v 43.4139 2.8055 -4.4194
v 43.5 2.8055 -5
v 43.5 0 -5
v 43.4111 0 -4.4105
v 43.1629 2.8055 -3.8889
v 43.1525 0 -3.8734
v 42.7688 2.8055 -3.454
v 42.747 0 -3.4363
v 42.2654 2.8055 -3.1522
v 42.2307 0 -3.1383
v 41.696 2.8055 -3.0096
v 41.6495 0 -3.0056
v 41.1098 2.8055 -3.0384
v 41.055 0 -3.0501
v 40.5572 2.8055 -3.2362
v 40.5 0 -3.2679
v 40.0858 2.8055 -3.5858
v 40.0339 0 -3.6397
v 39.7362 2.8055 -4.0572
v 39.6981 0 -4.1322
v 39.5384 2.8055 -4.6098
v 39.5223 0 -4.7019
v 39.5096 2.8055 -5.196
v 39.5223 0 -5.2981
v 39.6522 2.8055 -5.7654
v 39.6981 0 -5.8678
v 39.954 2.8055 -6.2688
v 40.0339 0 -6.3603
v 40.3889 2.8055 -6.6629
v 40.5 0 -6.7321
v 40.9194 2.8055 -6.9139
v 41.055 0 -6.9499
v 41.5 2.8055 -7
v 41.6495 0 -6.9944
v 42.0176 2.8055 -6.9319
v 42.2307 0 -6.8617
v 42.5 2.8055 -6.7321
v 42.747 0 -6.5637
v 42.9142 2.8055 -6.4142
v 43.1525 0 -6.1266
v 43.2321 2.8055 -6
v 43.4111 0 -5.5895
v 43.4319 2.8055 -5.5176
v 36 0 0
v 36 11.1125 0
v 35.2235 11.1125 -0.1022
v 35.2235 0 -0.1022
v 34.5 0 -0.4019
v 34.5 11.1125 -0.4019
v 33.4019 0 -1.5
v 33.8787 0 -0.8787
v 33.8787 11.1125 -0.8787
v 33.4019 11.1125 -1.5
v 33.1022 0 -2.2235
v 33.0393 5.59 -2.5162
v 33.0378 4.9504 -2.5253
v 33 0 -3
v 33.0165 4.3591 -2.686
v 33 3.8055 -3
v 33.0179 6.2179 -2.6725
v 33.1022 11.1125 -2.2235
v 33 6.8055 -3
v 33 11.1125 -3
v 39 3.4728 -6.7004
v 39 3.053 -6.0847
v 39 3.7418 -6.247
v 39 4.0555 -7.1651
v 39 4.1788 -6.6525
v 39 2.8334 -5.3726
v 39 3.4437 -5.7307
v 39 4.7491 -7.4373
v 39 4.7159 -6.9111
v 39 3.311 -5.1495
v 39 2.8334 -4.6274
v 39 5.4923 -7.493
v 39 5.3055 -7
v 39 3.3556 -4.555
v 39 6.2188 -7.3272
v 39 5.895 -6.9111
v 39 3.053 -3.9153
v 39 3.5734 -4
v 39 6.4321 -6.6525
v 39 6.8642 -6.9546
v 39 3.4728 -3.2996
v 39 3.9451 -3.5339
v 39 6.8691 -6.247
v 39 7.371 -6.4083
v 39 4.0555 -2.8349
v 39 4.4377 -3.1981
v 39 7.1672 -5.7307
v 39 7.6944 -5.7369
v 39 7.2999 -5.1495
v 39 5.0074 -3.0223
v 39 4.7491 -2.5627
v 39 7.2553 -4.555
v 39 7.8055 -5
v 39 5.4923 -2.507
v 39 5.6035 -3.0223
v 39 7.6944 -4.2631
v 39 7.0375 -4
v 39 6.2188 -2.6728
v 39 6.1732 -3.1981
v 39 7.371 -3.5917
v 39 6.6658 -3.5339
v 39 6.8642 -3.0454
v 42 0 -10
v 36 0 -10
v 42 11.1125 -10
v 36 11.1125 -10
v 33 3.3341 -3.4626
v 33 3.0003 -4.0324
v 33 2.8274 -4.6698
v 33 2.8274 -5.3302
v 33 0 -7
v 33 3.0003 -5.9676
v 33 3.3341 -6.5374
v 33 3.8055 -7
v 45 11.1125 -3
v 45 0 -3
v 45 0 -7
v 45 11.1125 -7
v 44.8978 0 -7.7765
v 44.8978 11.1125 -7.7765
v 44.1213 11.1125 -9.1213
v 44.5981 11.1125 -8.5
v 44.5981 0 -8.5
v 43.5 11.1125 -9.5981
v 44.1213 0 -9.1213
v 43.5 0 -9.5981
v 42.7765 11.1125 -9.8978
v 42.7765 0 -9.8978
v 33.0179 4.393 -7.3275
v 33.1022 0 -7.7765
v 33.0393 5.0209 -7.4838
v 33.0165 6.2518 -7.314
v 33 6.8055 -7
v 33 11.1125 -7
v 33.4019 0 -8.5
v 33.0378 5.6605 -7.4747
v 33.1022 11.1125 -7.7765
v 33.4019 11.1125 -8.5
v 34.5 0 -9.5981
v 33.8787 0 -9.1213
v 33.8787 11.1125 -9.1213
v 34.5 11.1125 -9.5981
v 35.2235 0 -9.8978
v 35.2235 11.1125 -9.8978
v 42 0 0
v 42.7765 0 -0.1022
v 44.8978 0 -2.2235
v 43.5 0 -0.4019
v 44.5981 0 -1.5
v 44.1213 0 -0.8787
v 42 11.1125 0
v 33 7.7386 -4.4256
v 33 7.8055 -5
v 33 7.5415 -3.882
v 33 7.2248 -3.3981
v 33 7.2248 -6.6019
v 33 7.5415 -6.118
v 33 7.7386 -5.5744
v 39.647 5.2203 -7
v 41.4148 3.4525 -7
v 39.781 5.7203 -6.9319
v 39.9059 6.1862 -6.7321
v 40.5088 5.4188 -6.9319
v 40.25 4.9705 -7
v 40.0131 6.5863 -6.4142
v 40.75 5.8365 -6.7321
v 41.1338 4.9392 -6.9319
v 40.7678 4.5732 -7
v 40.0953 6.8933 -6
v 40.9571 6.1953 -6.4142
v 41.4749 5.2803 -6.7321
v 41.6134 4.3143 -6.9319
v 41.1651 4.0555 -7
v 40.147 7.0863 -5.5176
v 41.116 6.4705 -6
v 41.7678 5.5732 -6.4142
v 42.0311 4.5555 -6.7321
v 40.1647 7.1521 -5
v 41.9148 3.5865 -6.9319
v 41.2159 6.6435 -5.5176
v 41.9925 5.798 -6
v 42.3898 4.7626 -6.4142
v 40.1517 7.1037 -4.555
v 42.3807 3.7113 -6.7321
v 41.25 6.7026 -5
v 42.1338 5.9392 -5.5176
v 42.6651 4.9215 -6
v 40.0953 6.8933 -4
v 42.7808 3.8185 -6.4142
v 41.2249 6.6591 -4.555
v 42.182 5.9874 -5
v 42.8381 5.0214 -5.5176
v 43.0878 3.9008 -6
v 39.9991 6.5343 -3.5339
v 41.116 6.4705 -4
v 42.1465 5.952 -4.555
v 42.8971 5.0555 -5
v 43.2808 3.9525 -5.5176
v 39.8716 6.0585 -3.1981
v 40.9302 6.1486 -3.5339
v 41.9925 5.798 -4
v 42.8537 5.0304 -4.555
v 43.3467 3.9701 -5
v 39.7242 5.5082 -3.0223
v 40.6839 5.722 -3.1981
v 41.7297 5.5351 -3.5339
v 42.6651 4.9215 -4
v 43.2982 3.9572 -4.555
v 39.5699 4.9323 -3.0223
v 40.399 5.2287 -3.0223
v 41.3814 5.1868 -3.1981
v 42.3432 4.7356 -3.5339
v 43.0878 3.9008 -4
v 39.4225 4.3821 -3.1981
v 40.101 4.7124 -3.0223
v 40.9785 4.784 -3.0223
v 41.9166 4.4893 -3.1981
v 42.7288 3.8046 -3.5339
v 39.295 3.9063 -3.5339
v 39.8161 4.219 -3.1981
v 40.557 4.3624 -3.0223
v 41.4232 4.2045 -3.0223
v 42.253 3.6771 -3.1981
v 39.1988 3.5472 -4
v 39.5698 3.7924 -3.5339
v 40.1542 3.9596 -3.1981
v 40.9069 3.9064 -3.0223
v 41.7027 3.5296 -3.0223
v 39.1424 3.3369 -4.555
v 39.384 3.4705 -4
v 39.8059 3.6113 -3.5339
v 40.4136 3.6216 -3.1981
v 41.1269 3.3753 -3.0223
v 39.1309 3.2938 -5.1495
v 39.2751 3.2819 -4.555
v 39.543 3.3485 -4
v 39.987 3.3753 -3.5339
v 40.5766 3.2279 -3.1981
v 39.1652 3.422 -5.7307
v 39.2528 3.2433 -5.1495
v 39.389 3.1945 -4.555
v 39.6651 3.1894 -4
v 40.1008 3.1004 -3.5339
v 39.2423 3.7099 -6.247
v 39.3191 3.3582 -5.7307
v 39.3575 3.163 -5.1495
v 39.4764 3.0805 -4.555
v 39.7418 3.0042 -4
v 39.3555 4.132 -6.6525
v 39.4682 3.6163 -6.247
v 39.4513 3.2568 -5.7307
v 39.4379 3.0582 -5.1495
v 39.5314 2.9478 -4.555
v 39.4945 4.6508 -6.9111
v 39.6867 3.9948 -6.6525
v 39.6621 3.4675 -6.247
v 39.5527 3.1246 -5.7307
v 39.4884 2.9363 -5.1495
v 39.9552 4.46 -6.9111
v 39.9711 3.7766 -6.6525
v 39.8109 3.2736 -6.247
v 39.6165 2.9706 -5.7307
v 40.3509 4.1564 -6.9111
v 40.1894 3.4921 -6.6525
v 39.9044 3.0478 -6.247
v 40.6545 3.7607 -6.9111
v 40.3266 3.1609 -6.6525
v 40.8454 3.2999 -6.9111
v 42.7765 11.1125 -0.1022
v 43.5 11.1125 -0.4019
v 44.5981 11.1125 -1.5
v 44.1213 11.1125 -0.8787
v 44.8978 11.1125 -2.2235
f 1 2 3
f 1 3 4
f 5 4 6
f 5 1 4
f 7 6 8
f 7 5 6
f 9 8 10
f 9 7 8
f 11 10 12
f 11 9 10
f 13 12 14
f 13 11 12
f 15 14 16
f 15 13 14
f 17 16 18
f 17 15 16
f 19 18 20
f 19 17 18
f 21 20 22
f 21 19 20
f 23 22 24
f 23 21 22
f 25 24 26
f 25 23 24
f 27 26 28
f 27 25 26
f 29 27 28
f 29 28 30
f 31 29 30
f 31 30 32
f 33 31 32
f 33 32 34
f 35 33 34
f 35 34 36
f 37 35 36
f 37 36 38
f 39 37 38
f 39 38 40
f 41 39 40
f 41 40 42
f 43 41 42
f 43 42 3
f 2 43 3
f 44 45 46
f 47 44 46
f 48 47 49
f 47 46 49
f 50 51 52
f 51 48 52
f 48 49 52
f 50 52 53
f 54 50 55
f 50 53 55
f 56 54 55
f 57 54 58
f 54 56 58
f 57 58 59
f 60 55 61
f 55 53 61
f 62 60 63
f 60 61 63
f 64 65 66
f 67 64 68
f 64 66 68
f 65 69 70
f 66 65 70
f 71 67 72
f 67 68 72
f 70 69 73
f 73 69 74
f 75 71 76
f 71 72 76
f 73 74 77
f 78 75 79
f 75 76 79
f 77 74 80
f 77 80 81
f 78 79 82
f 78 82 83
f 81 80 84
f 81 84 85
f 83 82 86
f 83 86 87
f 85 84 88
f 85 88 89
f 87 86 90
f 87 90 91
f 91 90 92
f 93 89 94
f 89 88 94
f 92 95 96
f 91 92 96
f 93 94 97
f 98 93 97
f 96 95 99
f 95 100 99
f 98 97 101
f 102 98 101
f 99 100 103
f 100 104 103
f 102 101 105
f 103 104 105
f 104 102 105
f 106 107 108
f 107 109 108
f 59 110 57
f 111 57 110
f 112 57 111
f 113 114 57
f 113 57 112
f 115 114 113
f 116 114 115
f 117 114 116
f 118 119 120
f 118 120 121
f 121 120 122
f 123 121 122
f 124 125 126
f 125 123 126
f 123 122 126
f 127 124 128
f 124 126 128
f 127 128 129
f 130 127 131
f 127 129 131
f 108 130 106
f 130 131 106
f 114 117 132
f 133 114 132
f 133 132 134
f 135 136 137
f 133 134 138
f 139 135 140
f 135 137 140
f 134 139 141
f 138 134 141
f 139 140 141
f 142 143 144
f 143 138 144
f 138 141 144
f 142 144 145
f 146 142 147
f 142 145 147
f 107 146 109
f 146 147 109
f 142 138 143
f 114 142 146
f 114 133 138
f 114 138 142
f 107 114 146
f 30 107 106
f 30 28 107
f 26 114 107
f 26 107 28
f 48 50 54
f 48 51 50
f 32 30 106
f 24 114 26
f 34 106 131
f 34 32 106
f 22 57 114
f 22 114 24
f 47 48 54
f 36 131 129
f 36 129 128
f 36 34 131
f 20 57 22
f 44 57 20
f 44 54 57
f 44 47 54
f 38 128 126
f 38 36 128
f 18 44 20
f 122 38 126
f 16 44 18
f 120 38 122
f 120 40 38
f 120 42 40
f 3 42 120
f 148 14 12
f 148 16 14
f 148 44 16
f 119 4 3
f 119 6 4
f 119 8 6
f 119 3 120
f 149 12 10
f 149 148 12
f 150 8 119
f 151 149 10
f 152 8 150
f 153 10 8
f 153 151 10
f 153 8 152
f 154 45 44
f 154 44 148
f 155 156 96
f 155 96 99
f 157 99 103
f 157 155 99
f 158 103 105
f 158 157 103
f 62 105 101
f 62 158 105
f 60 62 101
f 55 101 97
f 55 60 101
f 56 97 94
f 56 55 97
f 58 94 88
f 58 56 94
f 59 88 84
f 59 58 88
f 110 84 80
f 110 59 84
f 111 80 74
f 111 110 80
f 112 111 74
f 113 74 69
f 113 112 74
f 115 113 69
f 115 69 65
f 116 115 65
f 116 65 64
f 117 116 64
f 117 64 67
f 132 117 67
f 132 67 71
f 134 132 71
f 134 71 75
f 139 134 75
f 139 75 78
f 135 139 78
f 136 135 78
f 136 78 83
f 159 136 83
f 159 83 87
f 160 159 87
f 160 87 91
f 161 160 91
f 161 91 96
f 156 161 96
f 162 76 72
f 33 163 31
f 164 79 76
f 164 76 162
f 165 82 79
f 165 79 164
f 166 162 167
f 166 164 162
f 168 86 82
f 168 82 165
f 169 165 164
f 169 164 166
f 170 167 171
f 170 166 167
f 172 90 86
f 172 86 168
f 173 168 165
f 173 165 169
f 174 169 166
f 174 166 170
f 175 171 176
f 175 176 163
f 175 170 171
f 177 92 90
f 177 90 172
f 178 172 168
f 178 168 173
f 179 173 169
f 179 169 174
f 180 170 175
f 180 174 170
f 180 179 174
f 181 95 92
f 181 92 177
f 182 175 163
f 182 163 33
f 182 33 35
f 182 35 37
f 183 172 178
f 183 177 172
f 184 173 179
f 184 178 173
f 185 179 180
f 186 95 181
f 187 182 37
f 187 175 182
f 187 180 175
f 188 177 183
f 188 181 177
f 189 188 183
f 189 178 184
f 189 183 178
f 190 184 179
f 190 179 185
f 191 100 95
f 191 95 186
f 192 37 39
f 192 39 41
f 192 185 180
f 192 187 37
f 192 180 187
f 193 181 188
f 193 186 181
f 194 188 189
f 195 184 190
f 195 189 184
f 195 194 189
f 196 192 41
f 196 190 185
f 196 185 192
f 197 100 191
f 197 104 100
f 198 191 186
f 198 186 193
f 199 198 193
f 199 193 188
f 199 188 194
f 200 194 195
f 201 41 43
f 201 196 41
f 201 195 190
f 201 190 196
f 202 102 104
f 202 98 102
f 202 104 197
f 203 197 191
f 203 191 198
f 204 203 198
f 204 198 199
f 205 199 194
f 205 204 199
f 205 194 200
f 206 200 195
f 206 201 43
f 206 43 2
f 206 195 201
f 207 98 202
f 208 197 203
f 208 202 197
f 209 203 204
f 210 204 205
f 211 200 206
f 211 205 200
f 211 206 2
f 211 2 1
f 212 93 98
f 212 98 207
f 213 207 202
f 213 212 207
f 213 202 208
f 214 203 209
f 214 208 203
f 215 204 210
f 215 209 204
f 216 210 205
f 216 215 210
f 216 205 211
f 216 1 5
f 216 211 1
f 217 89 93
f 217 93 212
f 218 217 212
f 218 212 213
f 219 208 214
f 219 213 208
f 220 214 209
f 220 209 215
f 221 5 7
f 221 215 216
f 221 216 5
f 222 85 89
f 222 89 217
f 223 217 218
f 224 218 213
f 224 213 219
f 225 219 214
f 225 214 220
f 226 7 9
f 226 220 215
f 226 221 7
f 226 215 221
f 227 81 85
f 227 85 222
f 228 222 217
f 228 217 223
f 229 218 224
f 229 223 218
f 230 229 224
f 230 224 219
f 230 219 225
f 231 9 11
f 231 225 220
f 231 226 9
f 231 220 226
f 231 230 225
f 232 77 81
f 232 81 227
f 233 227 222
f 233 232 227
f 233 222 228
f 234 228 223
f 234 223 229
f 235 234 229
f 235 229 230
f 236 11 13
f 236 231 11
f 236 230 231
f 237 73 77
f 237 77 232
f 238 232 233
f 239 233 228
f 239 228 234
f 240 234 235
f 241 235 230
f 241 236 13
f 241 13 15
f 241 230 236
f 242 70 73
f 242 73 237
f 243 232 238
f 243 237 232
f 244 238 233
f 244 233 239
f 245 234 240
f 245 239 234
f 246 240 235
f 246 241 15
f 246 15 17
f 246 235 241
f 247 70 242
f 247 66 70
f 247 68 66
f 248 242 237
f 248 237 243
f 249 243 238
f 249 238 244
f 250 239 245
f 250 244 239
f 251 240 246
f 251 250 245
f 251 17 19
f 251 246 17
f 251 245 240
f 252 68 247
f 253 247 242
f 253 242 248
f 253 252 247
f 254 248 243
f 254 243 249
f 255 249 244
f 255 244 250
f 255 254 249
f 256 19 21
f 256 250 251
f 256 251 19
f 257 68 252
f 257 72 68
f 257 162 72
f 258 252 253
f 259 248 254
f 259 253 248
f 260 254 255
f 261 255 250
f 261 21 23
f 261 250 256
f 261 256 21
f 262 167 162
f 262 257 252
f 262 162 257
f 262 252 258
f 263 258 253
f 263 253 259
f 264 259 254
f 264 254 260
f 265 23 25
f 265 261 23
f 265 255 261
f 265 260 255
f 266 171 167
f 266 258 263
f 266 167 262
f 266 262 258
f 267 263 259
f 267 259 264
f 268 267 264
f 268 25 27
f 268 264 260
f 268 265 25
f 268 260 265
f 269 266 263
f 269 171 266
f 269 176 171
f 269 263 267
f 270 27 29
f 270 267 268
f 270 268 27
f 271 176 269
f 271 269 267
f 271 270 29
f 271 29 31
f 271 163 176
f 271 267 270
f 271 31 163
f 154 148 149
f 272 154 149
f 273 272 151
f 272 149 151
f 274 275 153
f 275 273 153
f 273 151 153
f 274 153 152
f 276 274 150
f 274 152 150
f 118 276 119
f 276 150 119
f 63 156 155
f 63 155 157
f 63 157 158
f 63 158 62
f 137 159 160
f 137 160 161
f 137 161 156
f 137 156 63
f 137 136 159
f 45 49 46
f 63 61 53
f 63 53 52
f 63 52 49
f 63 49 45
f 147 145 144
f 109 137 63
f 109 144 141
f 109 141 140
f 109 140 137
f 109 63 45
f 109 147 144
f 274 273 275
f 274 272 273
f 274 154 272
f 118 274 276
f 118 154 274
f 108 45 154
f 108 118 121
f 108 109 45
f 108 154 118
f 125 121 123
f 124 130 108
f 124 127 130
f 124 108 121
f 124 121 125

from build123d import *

# Parameters (mm, degrees)
BOSS_EXTRUDE1_DEPTH     = 10
CUT_EXTRUDE2_DEPTH      = 50.456381745
CUT_EXTRUDE2_DEPTH_BACK = 50.456381745
SKETCH3_R               = 2.5
CUT_EXTRUDE3_DEPTH      = 6
SKETCH4_R               = 2
CUT_REVOLVE1_ANGLE      = 90
SKETCH5_R               = 2
CUT_EXTRUDE4_DEPTH      = 2.805452299
FILLET1_R               = 5
SKETCH6_W               = 10
SKETCH6_H               = 29.685485307
CUT_EXTRUDE5_DEPTH      = 33
SKETCH7_W               = 19.76767366
SKETCH7_H               = 10
CUT_EXTRUDE6_DEPTH      = 48.418220859
FILLET2_R               = 3


with BuildPart() as part:
    # Sketch1 → Boss-Extrude1 (new body)
    with BuildSketch(Plane.XY):
        with BuildLine():
            Line((0, 0), (45, 0))
            Line((45, 0), (45, 11.1125))
            Line((45, 11.1125), (35, 11.1125))
            add(Edge.make_bspline(
                [(10, 11.1125), (14.576625097, 20.181995974), (30.423374903, 20.181995974), (35, 11.1125)],
                knots=[0, 0, 0, 0, 1, 1, 1, 1], degree=3))
            Line((10, 11.1125), (0, 11.1125))
            Line((0, 11.1125), (0, 0))
        make_face()
    extrude(amount=-BOSS_EXTRUDE1_DEPTH)

    # Sketch2 → Cut-Extrude2 (cut, two sides: drawn at the far end of the back side and taken through both)
    with BuildSketch(Plane.XY.offset(-CUT_EXTRUDE2_DEPTH_BACK)):
        with BuildLine():
            Line((33, 0), (33, 10.610904597))
            add(Edge.make_bspline(
                [(33, 10.610904597), (32.518518069, 11.455367364), (31.27134268, 12.982349636), (27.931157473, 15.20113612), (22.5, 16.390279221), (17.068842527, 15.20113612), (13.72865732, 12.982349636), (12.481481931, 11.455367364), (12, 10.610904597)],
                knots=[0.018308459, 0.018308459, 0.018308459, 0.018308459, 0.138731344, 0.25915423, 0.5, 0.74084577, 0.861268656, 0.981691541, 0.981691541, 0.981691541, 0.981691541], degree=3))
            Line((12, 10.610904597), (12, 0))
            Line((12, 0), (33, 0))
        make_face()
    extrude(amount=CUT_EXTRUDE2_DEPTH + CUT_EXTRUDE2_DEPTH_BACK, mode=Mode.SUBTRACT)

    # Sketch3 → Cut-Extrude3 (cut)
    with BuildSketch(Plane(origin=(12, 0, 0), x_dir=(0, 0, -1), z_dir=(1, 0, 0))):
        with Locations(Location((5, 5.305452299, 0), (0, 0, 90))):
            Circle(SKETCH3_R)
    cut_extrude3 = extrude(amount=-CUT_EXTRUDE3_DEPTH, mode=Mode.SUBTRACT)

    # Sketch4 → Cut-Revolve1 (revolve, cut)
    with BuildSketch(Plane(origin=(6, 0, 0), x_dir=(0, 0, -1), z_dir=(1, 0, 0))):
        with Locations((5, 5.305452299)):
            Circle(SKETCH4_R)
    cut_revolve1 = revolve(axis=Axis((6, 2.805452299, -5), (0, 0, 1)), revolution_arc=CUT_REVOLVE1_ANGLE, mode=Mode.SUBTRACT)

    # Sketch5 → Cut-Extrude4 (cut)
    with BuildSketch(Plane(origin=(0, 2.805452299, 0), x_dir=(1, 0, 0), z_dir=(0, 1, 0))):
        with Locations(Location((3.5, 5, 0), (0, 0, 180))):
            Circle(SKETCH5_R)
    cut_extrude4 = extrude(amount=-CUT_EXTRUDE4_DEPTH, mode=Mode.SUBTRACT)

    # Mirror1: Cut-Extrude3, Cut-Revolve1, Cut-Extrude4 across plane
    add(cut_extrude3.mirror(Plane(origin=(22.5, 0, 0), x_dir=(0, 0, 1), z_dir=(1, 0, 0))), mode=Mode.SUBTRACT)
    add(cut_revolve1.mirror(Plane(origin=(22.5, 0, 0), x_dir=(0, 0, 1), z_dir=(1, 0, 0))), mode=Mode.SUBTRACT)
    add(cut_extrude4.mirror(Plane(origin=(22.5, 0, 0), x_dir=(0, 0, 1), z_dir=(1, 0, 0))), mode=Mode.SUBTRACT)

    # Fillet1
    fillet1_edges = [part.edges().sort_by_distance(p)[0] for p in [
        (10, 11.1125, -5),
        (35, 11.1125, -5),
        (33, 10.610904597, -5),
        (12, 10.610904597, -5),
    ]]
    fillet(fillet1_edges, radius=FILLET1_R)

    # Sketch6 → Cut-Extrude5 (cut)
    with BuildSketch(Plane.ZY):
        with Locations((-5, 14.842742654)):
            Rectangle(SKETCH6_W, SKETCH6_H)
    extrude(amount=-CUT_EXTRUDE5_DEPTH, mode=Mode.SUBTRACT)

    # Sketch7 → Cut-Extrude6 (cut, through all)
    with BuildSketch(Plane(origin=(0, 11.1125, 0), x_dir=(1, 0, 0), z_dir=(0, 1, 0))):
        with Locations((35.11616317, 5)):
            Rectangle(SKETCH7_W, SKETCH7_H)
    extrude(amount=CUT_EXTRUDE6_DEPTH, mode=Mode.SUBTRACT)

    # Fillet2
    # the kernel refuses this fillet: 3 mm, written as the material it takes off along each edge
    with BuildSketch(Plane(origin=(45, -7.5, -10), x_dir=(0, 0, 1), z_dir=(0, 1, 0)), Plane(origin=(33, 18.6125, 0), x_dir=(1, 0, 0), z_dir=(0, -1, 0)), Plane(origin=(45, -7.5, 0), x_dir=(-1, 0, 0), z_dir=(0, 1, 0))) as fillet2_piece_1:
        with BuildLine():
            CenterArc((FILLET2_R, -FILLET2_R), FILLET2_R, 90, 90)
            Line((0, -FILLET2_R), (0, 0))
            Line((0, 0), (FILLET2_R, 0))
        make_face()
    extrude(amount=26.1125, mode=Mode.SUBTRACT)
    with BuildSketch(Plane(origin=(33, 18.6125, -10), x_dir=(1, 0, 0), z_dir=(0, -1, 0))) as fillet2_piece_2:
        with BuildLine():
            CenterArc((FILLET2_R, FILLET2_R), FILLET2_R, 180, 90)
            Line((0, FILLET2_R), (0, 0))
            Line((0, 0), (FILLET2_R, 0))
        make_face()
    extrude(amount=26.1125, mode=Mode.SUBTRACT)


solid = part.part
